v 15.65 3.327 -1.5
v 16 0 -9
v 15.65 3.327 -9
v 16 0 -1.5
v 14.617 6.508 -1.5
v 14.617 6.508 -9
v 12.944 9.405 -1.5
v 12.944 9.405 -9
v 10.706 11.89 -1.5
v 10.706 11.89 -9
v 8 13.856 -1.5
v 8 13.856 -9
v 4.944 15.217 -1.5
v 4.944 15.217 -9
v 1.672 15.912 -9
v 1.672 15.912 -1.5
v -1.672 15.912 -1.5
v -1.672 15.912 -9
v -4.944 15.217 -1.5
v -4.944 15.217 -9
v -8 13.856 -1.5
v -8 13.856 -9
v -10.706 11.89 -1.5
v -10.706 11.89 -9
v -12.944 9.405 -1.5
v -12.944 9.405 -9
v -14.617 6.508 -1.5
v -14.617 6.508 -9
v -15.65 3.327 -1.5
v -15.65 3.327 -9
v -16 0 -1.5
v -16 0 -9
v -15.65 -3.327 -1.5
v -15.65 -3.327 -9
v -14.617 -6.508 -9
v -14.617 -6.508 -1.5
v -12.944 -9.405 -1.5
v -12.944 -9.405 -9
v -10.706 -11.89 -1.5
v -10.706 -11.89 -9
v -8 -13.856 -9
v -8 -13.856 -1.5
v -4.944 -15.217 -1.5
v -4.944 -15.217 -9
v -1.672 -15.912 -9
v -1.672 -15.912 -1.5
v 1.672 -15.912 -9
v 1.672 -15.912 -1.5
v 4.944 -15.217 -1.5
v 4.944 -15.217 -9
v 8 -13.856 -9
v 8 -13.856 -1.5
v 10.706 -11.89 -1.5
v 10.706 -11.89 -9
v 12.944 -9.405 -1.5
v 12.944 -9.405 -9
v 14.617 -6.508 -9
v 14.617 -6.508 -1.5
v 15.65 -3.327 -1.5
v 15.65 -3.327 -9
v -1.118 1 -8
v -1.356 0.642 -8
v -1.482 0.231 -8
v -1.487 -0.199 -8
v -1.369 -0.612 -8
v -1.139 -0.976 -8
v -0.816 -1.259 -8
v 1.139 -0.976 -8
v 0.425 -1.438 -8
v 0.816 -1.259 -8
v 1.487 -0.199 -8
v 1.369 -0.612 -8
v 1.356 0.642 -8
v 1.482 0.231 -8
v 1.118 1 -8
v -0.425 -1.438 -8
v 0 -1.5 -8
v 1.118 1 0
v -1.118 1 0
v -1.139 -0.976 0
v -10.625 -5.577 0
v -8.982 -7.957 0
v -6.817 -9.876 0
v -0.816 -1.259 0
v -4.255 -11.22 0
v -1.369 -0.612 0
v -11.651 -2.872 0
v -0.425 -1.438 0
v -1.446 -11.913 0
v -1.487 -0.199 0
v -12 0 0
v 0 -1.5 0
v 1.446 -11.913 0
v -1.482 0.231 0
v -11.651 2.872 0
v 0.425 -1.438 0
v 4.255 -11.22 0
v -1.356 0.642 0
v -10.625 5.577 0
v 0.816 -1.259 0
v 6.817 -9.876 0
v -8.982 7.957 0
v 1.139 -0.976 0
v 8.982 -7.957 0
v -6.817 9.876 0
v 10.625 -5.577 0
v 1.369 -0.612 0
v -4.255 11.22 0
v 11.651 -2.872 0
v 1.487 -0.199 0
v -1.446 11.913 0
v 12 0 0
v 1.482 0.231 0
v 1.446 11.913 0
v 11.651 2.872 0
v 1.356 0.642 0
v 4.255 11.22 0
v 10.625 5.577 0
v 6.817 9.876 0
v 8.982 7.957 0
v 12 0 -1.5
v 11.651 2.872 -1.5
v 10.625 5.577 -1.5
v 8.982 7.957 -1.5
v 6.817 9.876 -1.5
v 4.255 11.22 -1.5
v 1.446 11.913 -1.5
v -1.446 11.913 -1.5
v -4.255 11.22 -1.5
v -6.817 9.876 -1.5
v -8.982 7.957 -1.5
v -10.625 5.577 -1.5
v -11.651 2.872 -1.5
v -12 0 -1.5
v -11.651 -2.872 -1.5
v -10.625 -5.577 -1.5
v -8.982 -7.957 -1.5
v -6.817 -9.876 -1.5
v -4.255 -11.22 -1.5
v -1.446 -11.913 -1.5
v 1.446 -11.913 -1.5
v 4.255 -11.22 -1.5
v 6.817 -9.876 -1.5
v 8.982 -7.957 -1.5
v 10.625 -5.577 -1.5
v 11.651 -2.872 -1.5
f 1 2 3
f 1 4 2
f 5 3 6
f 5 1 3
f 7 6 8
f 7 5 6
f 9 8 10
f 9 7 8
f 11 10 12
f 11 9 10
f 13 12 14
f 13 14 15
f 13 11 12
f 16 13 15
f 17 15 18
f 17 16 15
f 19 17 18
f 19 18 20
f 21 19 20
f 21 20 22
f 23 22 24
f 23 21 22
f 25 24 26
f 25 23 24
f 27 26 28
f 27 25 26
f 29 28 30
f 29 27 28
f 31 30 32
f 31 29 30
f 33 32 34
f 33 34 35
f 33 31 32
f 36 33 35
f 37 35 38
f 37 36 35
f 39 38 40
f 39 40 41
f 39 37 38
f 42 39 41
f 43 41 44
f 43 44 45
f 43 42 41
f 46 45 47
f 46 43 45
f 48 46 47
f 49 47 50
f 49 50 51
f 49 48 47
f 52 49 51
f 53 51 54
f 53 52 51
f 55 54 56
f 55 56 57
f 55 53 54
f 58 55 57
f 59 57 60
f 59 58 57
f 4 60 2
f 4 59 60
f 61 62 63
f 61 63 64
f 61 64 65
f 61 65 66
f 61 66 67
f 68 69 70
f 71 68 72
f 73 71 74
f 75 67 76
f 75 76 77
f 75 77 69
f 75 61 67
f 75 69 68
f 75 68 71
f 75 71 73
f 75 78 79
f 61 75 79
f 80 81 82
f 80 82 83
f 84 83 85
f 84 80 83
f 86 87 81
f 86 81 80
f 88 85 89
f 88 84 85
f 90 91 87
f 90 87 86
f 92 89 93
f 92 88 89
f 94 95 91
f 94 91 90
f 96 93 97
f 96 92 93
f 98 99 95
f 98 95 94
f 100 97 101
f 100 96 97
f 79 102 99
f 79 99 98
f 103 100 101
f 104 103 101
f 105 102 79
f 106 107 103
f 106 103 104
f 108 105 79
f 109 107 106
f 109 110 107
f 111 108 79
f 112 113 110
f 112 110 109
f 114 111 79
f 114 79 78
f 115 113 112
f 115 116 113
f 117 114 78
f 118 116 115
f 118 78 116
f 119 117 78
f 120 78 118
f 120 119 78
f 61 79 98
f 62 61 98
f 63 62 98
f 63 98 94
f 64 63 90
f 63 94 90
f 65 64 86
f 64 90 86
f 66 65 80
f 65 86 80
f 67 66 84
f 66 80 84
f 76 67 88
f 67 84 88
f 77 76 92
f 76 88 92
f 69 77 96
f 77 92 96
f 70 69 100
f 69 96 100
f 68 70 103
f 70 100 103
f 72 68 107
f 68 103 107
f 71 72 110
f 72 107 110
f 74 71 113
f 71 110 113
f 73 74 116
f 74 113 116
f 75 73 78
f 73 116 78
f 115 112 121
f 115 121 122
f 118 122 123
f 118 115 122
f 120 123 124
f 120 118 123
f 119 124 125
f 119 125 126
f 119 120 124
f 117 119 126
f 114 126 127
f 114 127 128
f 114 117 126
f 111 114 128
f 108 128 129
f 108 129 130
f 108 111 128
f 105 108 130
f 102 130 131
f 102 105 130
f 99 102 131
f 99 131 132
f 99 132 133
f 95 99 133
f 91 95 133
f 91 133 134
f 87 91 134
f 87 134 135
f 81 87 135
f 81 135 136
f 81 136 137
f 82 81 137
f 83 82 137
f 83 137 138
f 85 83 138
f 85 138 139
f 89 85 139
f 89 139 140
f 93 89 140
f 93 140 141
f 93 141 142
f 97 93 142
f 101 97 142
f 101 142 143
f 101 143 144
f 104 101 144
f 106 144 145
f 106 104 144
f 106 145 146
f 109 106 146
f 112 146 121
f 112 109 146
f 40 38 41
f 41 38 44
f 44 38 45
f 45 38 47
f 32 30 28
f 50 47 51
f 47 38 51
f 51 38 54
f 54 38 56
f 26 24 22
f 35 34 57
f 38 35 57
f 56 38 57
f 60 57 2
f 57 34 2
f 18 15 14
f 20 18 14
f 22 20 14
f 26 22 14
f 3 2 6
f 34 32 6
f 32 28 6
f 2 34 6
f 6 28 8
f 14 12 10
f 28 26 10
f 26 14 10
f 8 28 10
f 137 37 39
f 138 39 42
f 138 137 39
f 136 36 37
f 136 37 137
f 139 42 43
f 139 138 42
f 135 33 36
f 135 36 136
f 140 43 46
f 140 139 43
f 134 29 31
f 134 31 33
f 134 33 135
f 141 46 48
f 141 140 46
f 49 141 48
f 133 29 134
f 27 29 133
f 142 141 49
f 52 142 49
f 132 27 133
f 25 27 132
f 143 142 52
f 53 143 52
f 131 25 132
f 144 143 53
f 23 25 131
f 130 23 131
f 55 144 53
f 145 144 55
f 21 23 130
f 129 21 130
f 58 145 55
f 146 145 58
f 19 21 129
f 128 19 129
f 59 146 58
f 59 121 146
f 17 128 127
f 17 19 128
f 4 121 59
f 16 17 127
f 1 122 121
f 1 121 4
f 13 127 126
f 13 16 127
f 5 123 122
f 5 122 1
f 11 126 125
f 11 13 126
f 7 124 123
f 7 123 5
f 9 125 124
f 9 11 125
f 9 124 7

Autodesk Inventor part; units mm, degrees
ref_plane "YZ Plane" through (0, 0, 0) normal (1, 0, 0) x (0, 1, 0)
ref_plane "XZ Plane" through (0, 0, 0) normal (0, 1, 0) x (-1, 0, 0)
ref_plane "XY Plane" through (0, 0, 0) normal (0, 0, 1) x (1, 0, 0)
sketch "Sketch1" plane through (0, 0, 0) normal (0, 0, 1) x (1, 0, 0)
  circle A0 centre (0, 0) radius 16
  dimension "d0" = 32
extrude "Extrusion1" add sketch "Sketch1" against normal blind 9
sketch "Sketch2" plane through (0, 0, 0) normal (0, 0, 1) x (1, 0, 0)
  circle A0 centre (0, 0) radius 16 projected
  circle A1 centre (0, 0) radius 16
  circle A2 centre (0, 0) radius 12
  dimension "d3" = 32
  dimension "d4" = 24
extrude "Extrusion2" cut sketch "Sketch2" against normal blind 1.5
sketch "Sketch3" plane through (0, 0, 0) normal (0, 0, 1) x (1, 0, 0)
  circle A0 centre (0, 0) radius 12 projected
  arc A1 (-1.118, 1) -> (1.118, 1) centre (0, 0) ccw
  line L0 (0, 0) -> (0, 1)
  line L1 (0, 1) -> (-1.118, 1)
  line L2 (0, 1) -> (1.118, 1)
  arc A2 (1.118, 1) -> (-1.118, 1) centre (0, 0) ccw
  dimension "d7" = 3
  dimension "d8" = 1
extrude "Extrusion3" cut sketch "Sketch3" against normal blind 8 contours L1 L2 A1
properties part number "Wheel"
